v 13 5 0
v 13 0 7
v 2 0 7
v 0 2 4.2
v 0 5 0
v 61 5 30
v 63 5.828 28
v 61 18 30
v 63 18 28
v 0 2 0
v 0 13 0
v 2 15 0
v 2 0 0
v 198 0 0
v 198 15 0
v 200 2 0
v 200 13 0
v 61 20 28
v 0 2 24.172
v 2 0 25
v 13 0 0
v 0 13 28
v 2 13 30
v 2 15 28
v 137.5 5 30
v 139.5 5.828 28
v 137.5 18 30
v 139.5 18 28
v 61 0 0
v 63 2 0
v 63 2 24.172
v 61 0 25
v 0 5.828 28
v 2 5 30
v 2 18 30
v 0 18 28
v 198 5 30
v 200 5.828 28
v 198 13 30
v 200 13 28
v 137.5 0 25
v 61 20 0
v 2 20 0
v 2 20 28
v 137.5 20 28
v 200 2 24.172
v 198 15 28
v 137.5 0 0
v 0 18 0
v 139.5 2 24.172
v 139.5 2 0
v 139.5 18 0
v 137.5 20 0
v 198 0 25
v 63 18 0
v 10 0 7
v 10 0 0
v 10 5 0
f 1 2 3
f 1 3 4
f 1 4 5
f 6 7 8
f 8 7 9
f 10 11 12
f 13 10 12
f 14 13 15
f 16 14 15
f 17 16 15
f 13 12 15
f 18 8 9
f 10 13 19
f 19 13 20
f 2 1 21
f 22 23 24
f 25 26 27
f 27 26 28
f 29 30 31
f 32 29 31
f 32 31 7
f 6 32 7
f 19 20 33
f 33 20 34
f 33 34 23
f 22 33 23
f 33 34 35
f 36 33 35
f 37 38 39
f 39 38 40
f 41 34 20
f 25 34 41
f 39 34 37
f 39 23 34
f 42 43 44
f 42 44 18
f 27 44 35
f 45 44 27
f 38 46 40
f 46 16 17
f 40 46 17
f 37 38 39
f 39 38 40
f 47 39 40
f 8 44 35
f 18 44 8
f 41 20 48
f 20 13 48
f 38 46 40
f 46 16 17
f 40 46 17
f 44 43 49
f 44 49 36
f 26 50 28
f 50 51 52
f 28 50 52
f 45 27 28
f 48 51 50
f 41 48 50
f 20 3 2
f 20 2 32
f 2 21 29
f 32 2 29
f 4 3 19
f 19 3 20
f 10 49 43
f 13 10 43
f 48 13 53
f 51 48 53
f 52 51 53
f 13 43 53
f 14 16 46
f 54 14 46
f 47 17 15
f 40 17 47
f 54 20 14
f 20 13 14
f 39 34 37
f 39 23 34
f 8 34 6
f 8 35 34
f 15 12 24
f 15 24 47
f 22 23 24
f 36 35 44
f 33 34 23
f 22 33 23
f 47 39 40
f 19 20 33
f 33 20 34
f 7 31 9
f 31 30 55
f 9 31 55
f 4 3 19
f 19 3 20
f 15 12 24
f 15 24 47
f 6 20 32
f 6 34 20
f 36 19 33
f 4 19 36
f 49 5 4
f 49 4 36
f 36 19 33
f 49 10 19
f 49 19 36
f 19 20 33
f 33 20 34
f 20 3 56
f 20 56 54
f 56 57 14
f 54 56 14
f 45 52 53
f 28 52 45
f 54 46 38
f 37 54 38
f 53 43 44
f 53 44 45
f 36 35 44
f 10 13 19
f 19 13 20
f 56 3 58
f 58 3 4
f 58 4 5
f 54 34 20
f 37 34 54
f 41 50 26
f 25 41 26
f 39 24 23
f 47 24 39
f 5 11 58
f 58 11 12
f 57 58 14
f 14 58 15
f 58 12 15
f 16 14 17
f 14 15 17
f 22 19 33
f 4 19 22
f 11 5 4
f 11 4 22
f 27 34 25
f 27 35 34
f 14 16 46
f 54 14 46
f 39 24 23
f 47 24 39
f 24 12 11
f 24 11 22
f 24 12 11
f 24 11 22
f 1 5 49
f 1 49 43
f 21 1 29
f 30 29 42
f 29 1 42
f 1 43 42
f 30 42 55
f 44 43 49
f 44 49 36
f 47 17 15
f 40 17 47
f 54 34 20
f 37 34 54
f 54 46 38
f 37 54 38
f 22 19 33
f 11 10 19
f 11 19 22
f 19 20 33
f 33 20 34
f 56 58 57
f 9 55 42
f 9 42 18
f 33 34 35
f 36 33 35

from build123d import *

# Parameters (mm, degrees)
BOX_W           = 200
BOX_H           = 15
BOX_DEPTH       = 30
CHAMFER_SIZE    = 5
CHAMFER001_SIZE = 2
POCKET_DEPTH    = 10
BOX001_W        = 63
BOX001_H        = 20
BOX001_DEPTH    = 30
CHAMFER002_SIZE = 5
CHAMFER003_SIZE = 2
POCKET001_DEPTH = 13
BOX002_W        = 139.5
BOX002_H        = 20
BOX002_DEPTH    = 30
CHAMFER004_SIZE = 5
CHAMFER005_SIZE = 2
BOX003_W        = 200
BOX003_H        = 15
BOX003_DEPTH    = 30
CHAMFER006_SIZE = 5
CHAMFER007_SIZE = 2


with BuildPart() as body:
    # Box → Box (new body)
    with BuildSketch(Plane.XY):
        with Locations((100, 7.5)):
            Rectangle(BOX_W, BOX_H)
    extrude(amount=BOX_DEPTH)

    # Chamfer
    chamfer_edges = [body.edges().sort_by_distance(p)[0] for p in [
        (100, 0, 30),
    ]]
    chamfer(chamfer_edges, length=CHAMFER_SIZE)

    # Chamfer001
    chamfer001_edges = [body.edges().sort_by_distance(p)[0] for p in [
        (0, 10, 30),
        (200, 10, 30),
        (100, 15, 30),
        (200, 15, 15),
        (0, 15, 15),
        (0, 0, 12.5),
        (200, 0, 12.5),
        (0, 2.5, 27.5),
        (200, 2.5, 27.5),
    ]]
    chamfer(chamfer001_edges, length=CHAMFER001_SIZE)

    # Sketch (on Face1 of Chamfer001) → Pocket (cut, symmetric)
    with BuildSketch(Plane(origin=(0, 0, 0), x_dir=(0, -1, 0), z_dir=(-1, 0, 0))):
        Polygon((-5, 0), (0, 0), (0, 7), align=None)
    extrude(amount=POCKET_DEPTH, both=True, mode=Mode.SUBTRACT)


with BuildPart() as kulma_shimmi:
    # Box001 → Box001 (new body)
    with BuildSketch(Plane.XY):
        with Locations((31.5, 10)):
            Rectangle(BOX001_W, BOX001_H)
    extrude(amount=BOX001_DEPTH)

    # Chamfer002
    chamfer002_edges = [kulma_shimmi.edges().sort_by_distance(p)[0] for p in [
        (31.5, 0, 30),
    ]]
    chamfer(chamfer002_edges, length=CHAMFER002_SIZE)

    # Chamfer003
    chamfer003_edges = [kulma_shimmi.edges().sort_by_distance(p)[0] for p in [
        (0, 12.5, 30),
        (63, 12.5, 30),
        (31.5, 20, 30),
        (63, 20, 15),
        (0, 20, 15),
        (0, 0, 12.5),
        (63, 0, 12.5),
        (0, 2.5, 27.5),
        (63, 2.5, 27.5),
    ]]
    chamfer(chamfer003_edges, length=CHAMFER003_SIZE)

    # Sketch001 (on Face1 of Chamfer003) → Pocket001 (cut)
    with BuildSketch(Plane(origin=(0, 0, 0), x_dir=(0, -1, 0), z_dir=(-1, 0, 0))):
        Polygon((-5, 0), (0, 0), (0, 7), align=None)
    extrude(amount=-POCKET001_DEPTH, mode=Mode.SUBTRACT)


with BuildPart() as keski_shimmix4:
    # Box002 → Box002 (new body)
    with BuildSketch(Plane.XY):
        with Locations((69.75, 10)):
            Rectangle(BOX002_W, BOX002_H)
    extrude(amount=BOX002_DEPTH)

    # Chamfer004
    chamfer004_edges = [keski_shimmix4.edges().sort_by_distance(p)[0] for p in [
        (69.75, 0, 30),
    ]]
    chamfer(chamfer004_edges, length=CHAMFER004_SIZE)

    # Chamfer005
    chamfer005_edges = [keski_shimmix4.edges().sort_by_distance(p)[0] for p in [
        (0, 12.5, 30),
        (139.5, 12.5, 30),
        (69.75, 20, 30),
        (139.5, 20, 15),
        (0, 20, 15),
        (0, 0, 12.5),
        (139.5, 0, 12.5),
        (0, 2.5, 27.5),
        (139.5, 2.5, 27.5),
    ]]
    chamfer(chamfer005_edges, length=CHAMFER005_SIZE)


with BuildPart() as etu_taka_shimmix2:
    # Box003 → Box003 (new body)
    with BuildSketch(Plane.XY):
        with Locations((100, 7.5)):
            Rectangle(BOX003_W, BOX003_H)
    extrude(amount=BOX003_DEPTH)

    # Chamfer006
    chamfer006_edges = [etu_taka_shimmix2.edges().sort_by_distance(p)[0] for p in [
        (100, 0, 30),
    ]]
    chamfer(chamfer006_edges, length=CHAMFER006_SIZE)

    # Chamfer007
    chamfer007_edges = [etu_taka_shimmix2.edges().sort_by_distance(p)[0] for p in [
        (0, 10, 30),
        (200, 10, 30),
        (100, 15, 30),
        (200, 15, 15),
        (0, 15, 15),
        (0, 0, 12.5),
        (200, 0, 12.5),
        (0, 2.5, 27.5),
        (200, 2.5, 27.5),
    ]]
    chamfer(chamfer007_edges, length=CHAMFER007_SIZE)


solid = Compound([body.part, kulma_shimmi.part, keski_shimmix4.part, etu_taka_shimmix2.part])
